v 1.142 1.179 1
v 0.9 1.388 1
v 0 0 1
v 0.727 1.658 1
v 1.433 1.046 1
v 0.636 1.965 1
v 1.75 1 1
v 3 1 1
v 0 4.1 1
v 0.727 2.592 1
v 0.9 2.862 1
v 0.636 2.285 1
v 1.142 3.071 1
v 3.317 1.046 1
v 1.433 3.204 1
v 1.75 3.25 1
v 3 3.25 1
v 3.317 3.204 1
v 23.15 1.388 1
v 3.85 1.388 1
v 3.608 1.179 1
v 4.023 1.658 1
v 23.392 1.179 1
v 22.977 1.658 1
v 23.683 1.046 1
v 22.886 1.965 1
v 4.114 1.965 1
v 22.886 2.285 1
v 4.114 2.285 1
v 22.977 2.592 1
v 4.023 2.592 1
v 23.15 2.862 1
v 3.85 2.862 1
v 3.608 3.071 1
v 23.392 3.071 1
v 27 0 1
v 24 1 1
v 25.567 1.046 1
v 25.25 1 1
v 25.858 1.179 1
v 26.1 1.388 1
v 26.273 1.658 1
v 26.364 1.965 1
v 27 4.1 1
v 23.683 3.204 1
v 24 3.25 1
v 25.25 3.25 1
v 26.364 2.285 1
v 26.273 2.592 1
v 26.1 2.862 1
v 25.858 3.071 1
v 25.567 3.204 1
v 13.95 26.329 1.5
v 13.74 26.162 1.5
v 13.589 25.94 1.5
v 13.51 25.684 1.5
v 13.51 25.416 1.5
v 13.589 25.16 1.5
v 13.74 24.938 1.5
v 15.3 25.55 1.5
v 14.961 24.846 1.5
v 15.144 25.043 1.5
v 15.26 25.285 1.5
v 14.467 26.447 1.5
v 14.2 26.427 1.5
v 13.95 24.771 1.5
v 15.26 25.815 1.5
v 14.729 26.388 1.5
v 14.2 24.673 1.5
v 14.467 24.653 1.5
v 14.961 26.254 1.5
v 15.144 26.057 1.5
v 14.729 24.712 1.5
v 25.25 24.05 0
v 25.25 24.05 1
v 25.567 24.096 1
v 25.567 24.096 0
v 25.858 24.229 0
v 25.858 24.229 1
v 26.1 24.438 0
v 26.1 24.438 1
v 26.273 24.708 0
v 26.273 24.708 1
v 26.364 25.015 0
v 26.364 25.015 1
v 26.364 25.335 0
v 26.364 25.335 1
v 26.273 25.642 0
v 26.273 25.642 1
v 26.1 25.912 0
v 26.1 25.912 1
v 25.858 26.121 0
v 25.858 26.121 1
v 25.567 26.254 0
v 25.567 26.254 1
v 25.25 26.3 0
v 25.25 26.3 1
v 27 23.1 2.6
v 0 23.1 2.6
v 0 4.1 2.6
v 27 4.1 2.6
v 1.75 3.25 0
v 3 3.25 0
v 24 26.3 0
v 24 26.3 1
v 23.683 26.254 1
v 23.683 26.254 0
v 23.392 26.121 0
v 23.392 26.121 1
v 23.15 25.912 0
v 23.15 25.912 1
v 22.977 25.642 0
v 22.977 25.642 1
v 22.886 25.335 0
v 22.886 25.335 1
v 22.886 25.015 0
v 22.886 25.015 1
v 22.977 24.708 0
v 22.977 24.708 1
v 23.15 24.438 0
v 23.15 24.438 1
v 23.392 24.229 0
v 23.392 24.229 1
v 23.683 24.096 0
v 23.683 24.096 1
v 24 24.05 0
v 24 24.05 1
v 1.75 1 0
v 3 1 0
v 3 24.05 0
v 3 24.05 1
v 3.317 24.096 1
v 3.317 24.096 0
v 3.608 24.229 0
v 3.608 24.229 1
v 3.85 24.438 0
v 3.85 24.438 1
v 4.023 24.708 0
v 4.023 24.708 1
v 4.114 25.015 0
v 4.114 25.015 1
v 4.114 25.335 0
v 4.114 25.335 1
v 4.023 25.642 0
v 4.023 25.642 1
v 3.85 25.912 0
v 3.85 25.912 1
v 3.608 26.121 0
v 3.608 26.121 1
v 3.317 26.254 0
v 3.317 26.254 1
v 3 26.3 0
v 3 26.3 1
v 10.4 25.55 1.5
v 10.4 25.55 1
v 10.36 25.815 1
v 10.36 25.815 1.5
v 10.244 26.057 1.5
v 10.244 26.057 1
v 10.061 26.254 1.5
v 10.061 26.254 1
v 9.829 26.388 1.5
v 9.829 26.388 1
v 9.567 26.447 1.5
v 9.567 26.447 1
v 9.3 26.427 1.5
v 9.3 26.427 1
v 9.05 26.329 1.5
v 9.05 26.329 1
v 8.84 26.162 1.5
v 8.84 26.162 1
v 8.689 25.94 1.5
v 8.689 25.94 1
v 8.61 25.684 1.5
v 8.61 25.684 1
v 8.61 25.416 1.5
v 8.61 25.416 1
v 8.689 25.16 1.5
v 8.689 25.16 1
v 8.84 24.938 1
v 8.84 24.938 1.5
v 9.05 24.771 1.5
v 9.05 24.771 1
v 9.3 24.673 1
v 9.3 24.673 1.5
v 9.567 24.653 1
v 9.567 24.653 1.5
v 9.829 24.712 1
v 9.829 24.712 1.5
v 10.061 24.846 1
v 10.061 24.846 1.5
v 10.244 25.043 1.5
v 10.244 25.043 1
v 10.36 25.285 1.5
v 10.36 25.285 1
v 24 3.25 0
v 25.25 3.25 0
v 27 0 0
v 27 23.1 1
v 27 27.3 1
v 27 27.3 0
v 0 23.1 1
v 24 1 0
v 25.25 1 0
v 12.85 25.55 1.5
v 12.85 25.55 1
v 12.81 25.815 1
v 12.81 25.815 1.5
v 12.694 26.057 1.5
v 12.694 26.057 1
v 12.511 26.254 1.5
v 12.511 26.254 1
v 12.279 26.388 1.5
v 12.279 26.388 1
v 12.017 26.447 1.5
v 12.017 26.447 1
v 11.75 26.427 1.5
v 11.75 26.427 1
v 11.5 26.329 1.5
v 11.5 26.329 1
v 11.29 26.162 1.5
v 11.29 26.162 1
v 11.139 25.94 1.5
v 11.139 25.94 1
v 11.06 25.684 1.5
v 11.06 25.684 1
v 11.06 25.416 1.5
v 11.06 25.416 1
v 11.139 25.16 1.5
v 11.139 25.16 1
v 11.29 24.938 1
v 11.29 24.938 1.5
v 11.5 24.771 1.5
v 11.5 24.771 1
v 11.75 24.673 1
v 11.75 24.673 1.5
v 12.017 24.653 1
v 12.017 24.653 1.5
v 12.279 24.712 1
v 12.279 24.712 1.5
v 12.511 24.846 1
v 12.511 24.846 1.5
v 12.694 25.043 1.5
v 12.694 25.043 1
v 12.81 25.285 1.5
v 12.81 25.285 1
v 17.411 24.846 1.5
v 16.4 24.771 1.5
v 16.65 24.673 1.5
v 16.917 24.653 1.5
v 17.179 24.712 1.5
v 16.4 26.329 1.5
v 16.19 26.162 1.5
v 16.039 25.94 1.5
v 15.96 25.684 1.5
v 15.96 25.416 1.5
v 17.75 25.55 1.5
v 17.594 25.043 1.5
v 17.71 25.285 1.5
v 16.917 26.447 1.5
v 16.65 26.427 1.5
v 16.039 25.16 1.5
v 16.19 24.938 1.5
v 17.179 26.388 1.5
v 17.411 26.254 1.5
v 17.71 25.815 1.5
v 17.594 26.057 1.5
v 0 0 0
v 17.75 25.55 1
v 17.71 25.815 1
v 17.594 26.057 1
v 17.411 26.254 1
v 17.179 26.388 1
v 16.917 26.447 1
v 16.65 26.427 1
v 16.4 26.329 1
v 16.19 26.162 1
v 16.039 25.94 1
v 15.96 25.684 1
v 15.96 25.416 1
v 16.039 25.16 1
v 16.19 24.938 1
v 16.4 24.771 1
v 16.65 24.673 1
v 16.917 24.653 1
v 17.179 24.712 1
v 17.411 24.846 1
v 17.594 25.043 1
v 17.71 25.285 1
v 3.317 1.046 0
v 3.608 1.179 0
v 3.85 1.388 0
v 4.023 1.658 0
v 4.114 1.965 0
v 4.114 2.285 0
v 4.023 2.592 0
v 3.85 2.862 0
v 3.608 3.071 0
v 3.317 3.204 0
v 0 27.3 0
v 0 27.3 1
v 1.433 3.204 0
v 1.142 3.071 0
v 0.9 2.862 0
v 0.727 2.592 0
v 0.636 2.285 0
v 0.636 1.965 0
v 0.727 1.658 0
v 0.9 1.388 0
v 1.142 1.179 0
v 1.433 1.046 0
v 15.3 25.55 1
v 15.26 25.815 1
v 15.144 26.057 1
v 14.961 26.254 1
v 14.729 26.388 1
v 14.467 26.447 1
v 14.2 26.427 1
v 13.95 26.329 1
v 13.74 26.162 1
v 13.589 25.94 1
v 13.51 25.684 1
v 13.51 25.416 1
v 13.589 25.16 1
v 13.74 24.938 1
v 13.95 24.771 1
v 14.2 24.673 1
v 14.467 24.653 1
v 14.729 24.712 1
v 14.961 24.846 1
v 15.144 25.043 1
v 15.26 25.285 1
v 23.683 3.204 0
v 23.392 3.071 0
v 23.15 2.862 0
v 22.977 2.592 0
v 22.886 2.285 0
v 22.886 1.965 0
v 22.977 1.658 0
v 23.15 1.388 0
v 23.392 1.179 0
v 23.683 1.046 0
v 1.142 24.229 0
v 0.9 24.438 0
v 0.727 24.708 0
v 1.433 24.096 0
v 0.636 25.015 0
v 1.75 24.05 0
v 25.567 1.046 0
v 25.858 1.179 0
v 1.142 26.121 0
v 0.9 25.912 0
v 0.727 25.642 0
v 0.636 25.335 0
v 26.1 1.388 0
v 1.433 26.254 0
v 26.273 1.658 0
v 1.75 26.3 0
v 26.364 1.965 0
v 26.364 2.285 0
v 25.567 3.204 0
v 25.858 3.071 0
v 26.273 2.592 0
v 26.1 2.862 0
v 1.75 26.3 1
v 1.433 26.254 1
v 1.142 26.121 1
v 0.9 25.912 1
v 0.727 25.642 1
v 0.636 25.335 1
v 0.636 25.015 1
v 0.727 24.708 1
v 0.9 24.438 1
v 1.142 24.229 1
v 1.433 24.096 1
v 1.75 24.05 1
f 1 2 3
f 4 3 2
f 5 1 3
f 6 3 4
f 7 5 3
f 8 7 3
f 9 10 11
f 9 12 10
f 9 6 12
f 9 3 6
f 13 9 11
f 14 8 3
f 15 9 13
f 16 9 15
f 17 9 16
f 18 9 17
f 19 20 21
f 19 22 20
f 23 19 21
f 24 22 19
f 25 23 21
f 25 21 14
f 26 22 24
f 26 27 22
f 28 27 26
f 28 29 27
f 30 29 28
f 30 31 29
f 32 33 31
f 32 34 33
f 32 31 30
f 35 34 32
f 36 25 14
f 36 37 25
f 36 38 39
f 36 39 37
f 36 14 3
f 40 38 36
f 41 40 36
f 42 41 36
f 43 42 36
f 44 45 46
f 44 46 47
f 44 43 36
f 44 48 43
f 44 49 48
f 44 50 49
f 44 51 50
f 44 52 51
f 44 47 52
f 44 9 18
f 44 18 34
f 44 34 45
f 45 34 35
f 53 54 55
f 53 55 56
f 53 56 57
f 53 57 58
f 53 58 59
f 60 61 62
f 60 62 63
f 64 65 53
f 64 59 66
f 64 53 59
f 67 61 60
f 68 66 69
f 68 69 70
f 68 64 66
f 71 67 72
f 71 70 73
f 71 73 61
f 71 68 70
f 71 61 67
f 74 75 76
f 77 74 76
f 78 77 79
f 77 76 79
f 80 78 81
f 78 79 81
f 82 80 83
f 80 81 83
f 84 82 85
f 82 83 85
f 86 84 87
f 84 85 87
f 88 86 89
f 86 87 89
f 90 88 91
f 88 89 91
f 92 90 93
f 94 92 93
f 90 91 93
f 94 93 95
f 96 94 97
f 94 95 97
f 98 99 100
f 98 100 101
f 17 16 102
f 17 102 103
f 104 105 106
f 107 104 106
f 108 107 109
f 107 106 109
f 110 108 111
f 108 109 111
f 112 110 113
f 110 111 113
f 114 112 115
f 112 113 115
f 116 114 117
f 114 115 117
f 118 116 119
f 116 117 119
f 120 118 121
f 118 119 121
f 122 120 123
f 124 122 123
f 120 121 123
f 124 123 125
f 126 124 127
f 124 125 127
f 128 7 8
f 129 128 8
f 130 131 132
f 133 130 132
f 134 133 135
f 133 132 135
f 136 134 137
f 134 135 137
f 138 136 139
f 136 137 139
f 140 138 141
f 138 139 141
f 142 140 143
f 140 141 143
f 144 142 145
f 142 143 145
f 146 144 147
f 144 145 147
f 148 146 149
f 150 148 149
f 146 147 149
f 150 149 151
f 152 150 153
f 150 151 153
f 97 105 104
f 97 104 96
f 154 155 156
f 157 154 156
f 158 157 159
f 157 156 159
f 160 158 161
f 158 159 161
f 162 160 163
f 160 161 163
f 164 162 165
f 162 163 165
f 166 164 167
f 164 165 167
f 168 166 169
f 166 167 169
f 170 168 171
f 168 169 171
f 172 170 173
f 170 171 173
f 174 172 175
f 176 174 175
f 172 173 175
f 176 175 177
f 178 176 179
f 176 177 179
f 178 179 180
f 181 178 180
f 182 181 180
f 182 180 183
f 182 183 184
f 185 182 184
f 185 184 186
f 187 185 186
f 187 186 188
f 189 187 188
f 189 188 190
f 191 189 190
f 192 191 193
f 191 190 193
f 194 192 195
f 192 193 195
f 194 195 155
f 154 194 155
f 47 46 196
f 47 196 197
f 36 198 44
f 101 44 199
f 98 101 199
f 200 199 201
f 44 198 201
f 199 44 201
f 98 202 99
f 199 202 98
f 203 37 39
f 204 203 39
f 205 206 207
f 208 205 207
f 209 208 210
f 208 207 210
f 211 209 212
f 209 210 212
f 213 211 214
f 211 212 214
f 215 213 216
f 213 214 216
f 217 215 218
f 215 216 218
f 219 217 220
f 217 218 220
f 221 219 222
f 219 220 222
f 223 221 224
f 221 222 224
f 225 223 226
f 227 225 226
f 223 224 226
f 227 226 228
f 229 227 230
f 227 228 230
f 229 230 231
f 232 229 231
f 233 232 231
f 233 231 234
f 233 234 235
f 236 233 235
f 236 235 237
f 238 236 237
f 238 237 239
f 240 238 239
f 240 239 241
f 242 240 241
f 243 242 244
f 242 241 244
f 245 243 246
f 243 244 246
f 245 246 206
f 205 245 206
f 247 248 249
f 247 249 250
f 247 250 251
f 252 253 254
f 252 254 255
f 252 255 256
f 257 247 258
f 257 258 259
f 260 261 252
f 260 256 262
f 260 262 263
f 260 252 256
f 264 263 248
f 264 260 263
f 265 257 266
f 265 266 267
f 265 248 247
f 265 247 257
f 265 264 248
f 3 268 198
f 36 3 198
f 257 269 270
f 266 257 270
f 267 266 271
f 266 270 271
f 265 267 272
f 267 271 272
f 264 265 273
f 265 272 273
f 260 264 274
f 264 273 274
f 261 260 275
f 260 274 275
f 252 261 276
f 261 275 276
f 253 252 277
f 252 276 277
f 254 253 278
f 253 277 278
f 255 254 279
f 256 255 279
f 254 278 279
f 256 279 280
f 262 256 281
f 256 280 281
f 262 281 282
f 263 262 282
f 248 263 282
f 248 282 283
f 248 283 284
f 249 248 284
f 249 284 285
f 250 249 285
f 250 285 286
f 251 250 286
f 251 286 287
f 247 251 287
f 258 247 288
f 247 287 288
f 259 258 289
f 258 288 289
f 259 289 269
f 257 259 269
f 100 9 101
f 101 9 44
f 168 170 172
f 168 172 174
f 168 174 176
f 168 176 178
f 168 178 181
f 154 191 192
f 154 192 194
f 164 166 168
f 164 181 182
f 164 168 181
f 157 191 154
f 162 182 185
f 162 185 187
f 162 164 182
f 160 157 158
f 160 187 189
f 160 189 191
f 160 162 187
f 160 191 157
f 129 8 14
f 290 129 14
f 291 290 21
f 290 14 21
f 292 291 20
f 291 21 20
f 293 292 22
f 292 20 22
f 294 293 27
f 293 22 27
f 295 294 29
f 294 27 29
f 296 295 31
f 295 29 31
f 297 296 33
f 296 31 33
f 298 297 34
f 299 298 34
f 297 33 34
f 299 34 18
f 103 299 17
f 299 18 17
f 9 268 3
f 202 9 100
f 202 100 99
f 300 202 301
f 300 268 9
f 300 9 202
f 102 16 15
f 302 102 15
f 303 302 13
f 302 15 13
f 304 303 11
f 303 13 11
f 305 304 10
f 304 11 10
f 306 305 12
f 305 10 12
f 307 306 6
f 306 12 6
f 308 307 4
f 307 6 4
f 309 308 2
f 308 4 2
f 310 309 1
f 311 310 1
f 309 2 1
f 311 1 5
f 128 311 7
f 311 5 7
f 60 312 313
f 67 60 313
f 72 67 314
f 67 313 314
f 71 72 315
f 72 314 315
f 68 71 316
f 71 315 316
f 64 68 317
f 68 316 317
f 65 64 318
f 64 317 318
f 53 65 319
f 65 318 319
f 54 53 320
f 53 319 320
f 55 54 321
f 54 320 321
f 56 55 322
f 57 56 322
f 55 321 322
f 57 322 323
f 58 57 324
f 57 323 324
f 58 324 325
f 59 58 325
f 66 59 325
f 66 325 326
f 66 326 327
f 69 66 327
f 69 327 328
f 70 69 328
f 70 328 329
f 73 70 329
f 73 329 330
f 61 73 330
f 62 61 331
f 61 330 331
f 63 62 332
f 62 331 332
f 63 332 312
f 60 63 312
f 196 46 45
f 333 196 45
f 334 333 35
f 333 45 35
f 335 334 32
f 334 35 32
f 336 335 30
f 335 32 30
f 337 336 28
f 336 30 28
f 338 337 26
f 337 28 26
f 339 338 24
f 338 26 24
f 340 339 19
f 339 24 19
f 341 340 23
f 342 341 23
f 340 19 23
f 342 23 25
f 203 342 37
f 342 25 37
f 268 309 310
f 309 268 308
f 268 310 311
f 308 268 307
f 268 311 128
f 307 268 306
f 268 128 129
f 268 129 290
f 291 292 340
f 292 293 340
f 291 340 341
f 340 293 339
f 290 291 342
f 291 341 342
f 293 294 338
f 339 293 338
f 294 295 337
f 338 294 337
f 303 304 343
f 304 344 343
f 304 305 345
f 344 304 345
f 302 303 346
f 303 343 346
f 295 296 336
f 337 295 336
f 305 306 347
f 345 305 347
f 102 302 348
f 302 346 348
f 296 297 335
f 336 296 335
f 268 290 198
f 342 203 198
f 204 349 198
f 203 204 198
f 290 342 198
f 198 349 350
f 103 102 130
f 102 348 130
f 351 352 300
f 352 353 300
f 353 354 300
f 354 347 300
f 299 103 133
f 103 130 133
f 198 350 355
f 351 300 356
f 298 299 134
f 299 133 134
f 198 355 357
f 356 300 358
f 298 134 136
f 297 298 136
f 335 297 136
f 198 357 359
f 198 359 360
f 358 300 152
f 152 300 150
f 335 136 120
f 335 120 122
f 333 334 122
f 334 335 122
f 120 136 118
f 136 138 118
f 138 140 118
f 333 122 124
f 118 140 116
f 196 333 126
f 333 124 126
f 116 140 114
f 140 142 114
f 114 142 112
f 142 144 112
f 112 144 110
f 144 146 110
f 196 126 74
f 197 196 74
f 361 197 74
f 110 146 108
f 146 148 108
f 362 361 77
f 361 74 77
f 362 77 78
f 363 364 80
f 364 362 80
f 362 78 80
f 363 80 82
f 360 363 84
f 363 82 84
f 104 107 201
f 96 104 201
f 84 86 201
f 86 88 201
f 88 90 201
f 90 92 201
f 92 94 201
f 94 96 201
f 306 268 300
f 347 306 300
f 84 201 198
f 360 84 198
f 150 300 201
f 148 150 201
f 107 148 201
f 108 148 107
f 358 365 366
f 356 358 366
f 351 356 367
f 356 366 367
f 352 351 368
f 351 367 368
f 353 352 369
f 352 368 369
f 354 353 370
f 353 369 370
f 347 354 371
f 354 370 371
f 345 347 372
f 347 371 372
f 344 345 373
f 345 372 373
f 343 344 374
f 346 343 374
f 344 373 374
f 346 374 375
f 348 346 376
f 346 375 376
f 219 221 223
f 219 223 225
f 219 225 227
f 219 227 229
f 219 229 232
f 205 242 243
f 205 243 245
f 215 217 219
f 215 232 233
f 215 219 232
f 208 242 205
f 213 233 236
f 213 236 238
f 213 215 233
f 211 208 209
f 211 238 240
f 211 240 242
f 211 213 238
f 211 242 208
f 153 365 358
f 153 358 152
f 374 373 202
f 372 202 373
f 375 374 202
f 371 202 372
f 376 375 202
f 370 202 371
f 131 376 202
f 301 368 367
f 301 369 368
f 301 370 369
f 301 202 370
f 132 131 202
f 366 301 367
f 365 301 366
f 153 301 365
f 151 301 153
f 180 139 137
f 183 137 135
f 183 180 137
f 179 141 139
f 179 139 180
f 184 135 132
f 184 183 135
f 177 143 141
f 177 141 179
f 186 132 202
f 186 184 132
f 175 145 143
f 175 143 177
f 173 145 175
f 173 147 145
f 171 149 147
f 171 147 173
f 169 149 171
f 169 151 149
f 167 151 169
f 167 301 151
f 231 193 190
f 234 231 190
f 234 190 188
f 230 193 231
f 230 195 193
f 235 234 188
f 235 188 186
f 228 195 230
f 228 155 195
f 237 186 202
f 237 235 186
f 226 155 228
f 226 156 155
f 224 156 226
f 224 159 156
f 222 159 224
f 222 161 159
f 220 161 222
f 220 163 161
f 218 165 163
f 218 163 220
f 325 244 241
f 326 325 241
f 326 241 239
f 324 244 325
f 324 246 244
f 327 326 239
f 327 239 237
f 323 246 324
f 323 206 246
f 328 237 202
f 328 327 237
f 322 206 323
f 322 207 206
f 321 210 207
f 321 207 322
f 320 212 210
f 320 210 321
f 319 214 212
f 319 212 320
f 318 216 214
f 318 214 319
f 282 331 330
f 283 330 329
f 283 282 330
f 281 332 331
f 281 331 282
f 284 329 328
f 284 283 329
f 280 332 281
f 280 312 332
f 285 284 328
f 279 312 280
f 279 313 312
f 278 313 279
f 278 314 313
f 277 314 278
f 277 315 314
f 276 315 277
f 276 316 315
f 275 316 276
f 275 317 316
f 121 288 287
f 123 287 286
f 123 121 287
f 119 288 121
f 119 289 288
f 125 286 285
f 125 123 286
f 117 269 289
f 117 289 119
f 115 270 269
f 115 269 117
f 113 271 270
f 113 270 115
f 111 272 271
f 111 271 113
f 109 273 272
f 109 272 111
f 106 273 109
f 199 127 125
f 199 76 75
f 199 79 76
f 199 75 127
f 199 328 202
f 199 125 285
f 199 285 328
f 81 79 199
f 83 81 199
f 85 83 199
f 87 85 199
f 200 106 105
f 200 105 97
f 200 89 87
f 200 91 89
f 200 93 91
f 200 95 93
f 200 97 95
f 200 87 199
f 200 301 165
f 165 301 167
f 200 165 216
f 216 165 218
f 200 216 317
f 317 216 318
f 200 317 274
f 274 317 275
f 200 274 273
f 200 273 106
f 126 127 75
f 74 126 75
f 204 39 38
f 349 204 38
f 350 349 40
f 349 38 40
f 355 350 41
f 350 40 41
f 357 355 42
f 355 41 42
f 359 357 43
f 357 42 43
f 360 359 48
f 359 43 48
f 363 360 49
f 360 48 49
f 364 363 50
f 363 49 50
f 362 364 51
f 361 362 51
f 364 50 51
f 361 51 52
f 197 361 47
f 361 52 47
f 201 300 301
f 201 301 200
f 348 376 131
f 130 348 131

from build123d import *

# Parameters (mm, degrees)
SKETCH004_W     = 27
SKETCH004_H     = 27.3
PAD005_DEPTH    = 1
POCKET003_DEPTH = 1.001
SKETCH005_W     = 27
SKETCH005_H     = 19
PAD001_DEPTH    = 1.6
SKETCH006_R     = 0.9
PAD006_DEPTH    = 0.5


with BuildPart() as part:
    # Sketch004 → Pad005 (new body)
    with BuildSketch(Plane.XY):
        with Locations((13.5, 13.65)):
            Rectangle(SKETCH004_W, SKETCH004_H)
    extrude(amount=PAD005_DEPTH)

    # Sketch001 → Pocket003 (cut, through all)
    with BuildSketch(Plane.XY.offset(1)):
        with BuildLine():
            ThreePointArc((1.75, 26.3), (0.625, 25.175), (1.75, 24.05))
            Line((1.75, 24.05), (3, 24.05))
            ThreePointArc((3, 24.05), (4.125, 25.175), (3, 26.3))
            Line((1.75, 26.3), (3, 26.3))
        make_face()
        with BuildLine():
            ThreePointArc((24, 26.3), (22.875, 25.175), (24, 24.05))
            Line((24, 24.05), (25.25, 24.05))
            ThreePointArc((25.25, 24.05), (26.375, 25.175), (25.25, 26.3))
            Line((24, 26.3), (25.25, 26.3))
        make_face()
        with BuildLine():
            ThreePointArc((1.75, 3.25), (0.625, 2.125), (1.75, 1))
            Line((1.75, 1), (3, 1))
            ThreePointArc((3, 1), (4.125, 2.125), (3, 3.25))
            Line((1.75, 3.25), (3, 3.25))
        make_face()
        with BuildLine():
            ThreePointArc((24, 3.25), (22.875, 2.125), (24, 1))
            Line((24, 1), (25.25, 1))
            ThreePointArc((25.25, 1), (26.375, 2.125), (25.25, 3.25))
            Line((24, 3.25), (25.25, 3.25))
        make_face()
    extrude(amount=-POCKET003_DEPTH, mode=Mode.SUBTRACT)

    # Sketch005 → Pad001 (new body)
    with BuildSketch(Plane.XY.offset(1)):
        with Locations((13.5, 13.6)):
            Rectangle(SKETCH005_W, SKETCH005_H)
    extrude(amount=PAD001_DEPTH)

    # Sketch006 → Pad006 (new body)
    with BuildSketch(Plane.XY.offset(1)):
        with Locations((9.5, 25.55)):
            Circle(SKETCH006_R)
        with Locations((11.95, 25.55)):
            Circle(SKETCH006_R)
        with Locations((14.4, 25.55)):
            Circle(SKETCH006_R)
        with Locations((16.85, 25.55)):
            Circle(SKETCH006_R)
    extrude(amount=PAD006_DEPTH)


solid = part.part
